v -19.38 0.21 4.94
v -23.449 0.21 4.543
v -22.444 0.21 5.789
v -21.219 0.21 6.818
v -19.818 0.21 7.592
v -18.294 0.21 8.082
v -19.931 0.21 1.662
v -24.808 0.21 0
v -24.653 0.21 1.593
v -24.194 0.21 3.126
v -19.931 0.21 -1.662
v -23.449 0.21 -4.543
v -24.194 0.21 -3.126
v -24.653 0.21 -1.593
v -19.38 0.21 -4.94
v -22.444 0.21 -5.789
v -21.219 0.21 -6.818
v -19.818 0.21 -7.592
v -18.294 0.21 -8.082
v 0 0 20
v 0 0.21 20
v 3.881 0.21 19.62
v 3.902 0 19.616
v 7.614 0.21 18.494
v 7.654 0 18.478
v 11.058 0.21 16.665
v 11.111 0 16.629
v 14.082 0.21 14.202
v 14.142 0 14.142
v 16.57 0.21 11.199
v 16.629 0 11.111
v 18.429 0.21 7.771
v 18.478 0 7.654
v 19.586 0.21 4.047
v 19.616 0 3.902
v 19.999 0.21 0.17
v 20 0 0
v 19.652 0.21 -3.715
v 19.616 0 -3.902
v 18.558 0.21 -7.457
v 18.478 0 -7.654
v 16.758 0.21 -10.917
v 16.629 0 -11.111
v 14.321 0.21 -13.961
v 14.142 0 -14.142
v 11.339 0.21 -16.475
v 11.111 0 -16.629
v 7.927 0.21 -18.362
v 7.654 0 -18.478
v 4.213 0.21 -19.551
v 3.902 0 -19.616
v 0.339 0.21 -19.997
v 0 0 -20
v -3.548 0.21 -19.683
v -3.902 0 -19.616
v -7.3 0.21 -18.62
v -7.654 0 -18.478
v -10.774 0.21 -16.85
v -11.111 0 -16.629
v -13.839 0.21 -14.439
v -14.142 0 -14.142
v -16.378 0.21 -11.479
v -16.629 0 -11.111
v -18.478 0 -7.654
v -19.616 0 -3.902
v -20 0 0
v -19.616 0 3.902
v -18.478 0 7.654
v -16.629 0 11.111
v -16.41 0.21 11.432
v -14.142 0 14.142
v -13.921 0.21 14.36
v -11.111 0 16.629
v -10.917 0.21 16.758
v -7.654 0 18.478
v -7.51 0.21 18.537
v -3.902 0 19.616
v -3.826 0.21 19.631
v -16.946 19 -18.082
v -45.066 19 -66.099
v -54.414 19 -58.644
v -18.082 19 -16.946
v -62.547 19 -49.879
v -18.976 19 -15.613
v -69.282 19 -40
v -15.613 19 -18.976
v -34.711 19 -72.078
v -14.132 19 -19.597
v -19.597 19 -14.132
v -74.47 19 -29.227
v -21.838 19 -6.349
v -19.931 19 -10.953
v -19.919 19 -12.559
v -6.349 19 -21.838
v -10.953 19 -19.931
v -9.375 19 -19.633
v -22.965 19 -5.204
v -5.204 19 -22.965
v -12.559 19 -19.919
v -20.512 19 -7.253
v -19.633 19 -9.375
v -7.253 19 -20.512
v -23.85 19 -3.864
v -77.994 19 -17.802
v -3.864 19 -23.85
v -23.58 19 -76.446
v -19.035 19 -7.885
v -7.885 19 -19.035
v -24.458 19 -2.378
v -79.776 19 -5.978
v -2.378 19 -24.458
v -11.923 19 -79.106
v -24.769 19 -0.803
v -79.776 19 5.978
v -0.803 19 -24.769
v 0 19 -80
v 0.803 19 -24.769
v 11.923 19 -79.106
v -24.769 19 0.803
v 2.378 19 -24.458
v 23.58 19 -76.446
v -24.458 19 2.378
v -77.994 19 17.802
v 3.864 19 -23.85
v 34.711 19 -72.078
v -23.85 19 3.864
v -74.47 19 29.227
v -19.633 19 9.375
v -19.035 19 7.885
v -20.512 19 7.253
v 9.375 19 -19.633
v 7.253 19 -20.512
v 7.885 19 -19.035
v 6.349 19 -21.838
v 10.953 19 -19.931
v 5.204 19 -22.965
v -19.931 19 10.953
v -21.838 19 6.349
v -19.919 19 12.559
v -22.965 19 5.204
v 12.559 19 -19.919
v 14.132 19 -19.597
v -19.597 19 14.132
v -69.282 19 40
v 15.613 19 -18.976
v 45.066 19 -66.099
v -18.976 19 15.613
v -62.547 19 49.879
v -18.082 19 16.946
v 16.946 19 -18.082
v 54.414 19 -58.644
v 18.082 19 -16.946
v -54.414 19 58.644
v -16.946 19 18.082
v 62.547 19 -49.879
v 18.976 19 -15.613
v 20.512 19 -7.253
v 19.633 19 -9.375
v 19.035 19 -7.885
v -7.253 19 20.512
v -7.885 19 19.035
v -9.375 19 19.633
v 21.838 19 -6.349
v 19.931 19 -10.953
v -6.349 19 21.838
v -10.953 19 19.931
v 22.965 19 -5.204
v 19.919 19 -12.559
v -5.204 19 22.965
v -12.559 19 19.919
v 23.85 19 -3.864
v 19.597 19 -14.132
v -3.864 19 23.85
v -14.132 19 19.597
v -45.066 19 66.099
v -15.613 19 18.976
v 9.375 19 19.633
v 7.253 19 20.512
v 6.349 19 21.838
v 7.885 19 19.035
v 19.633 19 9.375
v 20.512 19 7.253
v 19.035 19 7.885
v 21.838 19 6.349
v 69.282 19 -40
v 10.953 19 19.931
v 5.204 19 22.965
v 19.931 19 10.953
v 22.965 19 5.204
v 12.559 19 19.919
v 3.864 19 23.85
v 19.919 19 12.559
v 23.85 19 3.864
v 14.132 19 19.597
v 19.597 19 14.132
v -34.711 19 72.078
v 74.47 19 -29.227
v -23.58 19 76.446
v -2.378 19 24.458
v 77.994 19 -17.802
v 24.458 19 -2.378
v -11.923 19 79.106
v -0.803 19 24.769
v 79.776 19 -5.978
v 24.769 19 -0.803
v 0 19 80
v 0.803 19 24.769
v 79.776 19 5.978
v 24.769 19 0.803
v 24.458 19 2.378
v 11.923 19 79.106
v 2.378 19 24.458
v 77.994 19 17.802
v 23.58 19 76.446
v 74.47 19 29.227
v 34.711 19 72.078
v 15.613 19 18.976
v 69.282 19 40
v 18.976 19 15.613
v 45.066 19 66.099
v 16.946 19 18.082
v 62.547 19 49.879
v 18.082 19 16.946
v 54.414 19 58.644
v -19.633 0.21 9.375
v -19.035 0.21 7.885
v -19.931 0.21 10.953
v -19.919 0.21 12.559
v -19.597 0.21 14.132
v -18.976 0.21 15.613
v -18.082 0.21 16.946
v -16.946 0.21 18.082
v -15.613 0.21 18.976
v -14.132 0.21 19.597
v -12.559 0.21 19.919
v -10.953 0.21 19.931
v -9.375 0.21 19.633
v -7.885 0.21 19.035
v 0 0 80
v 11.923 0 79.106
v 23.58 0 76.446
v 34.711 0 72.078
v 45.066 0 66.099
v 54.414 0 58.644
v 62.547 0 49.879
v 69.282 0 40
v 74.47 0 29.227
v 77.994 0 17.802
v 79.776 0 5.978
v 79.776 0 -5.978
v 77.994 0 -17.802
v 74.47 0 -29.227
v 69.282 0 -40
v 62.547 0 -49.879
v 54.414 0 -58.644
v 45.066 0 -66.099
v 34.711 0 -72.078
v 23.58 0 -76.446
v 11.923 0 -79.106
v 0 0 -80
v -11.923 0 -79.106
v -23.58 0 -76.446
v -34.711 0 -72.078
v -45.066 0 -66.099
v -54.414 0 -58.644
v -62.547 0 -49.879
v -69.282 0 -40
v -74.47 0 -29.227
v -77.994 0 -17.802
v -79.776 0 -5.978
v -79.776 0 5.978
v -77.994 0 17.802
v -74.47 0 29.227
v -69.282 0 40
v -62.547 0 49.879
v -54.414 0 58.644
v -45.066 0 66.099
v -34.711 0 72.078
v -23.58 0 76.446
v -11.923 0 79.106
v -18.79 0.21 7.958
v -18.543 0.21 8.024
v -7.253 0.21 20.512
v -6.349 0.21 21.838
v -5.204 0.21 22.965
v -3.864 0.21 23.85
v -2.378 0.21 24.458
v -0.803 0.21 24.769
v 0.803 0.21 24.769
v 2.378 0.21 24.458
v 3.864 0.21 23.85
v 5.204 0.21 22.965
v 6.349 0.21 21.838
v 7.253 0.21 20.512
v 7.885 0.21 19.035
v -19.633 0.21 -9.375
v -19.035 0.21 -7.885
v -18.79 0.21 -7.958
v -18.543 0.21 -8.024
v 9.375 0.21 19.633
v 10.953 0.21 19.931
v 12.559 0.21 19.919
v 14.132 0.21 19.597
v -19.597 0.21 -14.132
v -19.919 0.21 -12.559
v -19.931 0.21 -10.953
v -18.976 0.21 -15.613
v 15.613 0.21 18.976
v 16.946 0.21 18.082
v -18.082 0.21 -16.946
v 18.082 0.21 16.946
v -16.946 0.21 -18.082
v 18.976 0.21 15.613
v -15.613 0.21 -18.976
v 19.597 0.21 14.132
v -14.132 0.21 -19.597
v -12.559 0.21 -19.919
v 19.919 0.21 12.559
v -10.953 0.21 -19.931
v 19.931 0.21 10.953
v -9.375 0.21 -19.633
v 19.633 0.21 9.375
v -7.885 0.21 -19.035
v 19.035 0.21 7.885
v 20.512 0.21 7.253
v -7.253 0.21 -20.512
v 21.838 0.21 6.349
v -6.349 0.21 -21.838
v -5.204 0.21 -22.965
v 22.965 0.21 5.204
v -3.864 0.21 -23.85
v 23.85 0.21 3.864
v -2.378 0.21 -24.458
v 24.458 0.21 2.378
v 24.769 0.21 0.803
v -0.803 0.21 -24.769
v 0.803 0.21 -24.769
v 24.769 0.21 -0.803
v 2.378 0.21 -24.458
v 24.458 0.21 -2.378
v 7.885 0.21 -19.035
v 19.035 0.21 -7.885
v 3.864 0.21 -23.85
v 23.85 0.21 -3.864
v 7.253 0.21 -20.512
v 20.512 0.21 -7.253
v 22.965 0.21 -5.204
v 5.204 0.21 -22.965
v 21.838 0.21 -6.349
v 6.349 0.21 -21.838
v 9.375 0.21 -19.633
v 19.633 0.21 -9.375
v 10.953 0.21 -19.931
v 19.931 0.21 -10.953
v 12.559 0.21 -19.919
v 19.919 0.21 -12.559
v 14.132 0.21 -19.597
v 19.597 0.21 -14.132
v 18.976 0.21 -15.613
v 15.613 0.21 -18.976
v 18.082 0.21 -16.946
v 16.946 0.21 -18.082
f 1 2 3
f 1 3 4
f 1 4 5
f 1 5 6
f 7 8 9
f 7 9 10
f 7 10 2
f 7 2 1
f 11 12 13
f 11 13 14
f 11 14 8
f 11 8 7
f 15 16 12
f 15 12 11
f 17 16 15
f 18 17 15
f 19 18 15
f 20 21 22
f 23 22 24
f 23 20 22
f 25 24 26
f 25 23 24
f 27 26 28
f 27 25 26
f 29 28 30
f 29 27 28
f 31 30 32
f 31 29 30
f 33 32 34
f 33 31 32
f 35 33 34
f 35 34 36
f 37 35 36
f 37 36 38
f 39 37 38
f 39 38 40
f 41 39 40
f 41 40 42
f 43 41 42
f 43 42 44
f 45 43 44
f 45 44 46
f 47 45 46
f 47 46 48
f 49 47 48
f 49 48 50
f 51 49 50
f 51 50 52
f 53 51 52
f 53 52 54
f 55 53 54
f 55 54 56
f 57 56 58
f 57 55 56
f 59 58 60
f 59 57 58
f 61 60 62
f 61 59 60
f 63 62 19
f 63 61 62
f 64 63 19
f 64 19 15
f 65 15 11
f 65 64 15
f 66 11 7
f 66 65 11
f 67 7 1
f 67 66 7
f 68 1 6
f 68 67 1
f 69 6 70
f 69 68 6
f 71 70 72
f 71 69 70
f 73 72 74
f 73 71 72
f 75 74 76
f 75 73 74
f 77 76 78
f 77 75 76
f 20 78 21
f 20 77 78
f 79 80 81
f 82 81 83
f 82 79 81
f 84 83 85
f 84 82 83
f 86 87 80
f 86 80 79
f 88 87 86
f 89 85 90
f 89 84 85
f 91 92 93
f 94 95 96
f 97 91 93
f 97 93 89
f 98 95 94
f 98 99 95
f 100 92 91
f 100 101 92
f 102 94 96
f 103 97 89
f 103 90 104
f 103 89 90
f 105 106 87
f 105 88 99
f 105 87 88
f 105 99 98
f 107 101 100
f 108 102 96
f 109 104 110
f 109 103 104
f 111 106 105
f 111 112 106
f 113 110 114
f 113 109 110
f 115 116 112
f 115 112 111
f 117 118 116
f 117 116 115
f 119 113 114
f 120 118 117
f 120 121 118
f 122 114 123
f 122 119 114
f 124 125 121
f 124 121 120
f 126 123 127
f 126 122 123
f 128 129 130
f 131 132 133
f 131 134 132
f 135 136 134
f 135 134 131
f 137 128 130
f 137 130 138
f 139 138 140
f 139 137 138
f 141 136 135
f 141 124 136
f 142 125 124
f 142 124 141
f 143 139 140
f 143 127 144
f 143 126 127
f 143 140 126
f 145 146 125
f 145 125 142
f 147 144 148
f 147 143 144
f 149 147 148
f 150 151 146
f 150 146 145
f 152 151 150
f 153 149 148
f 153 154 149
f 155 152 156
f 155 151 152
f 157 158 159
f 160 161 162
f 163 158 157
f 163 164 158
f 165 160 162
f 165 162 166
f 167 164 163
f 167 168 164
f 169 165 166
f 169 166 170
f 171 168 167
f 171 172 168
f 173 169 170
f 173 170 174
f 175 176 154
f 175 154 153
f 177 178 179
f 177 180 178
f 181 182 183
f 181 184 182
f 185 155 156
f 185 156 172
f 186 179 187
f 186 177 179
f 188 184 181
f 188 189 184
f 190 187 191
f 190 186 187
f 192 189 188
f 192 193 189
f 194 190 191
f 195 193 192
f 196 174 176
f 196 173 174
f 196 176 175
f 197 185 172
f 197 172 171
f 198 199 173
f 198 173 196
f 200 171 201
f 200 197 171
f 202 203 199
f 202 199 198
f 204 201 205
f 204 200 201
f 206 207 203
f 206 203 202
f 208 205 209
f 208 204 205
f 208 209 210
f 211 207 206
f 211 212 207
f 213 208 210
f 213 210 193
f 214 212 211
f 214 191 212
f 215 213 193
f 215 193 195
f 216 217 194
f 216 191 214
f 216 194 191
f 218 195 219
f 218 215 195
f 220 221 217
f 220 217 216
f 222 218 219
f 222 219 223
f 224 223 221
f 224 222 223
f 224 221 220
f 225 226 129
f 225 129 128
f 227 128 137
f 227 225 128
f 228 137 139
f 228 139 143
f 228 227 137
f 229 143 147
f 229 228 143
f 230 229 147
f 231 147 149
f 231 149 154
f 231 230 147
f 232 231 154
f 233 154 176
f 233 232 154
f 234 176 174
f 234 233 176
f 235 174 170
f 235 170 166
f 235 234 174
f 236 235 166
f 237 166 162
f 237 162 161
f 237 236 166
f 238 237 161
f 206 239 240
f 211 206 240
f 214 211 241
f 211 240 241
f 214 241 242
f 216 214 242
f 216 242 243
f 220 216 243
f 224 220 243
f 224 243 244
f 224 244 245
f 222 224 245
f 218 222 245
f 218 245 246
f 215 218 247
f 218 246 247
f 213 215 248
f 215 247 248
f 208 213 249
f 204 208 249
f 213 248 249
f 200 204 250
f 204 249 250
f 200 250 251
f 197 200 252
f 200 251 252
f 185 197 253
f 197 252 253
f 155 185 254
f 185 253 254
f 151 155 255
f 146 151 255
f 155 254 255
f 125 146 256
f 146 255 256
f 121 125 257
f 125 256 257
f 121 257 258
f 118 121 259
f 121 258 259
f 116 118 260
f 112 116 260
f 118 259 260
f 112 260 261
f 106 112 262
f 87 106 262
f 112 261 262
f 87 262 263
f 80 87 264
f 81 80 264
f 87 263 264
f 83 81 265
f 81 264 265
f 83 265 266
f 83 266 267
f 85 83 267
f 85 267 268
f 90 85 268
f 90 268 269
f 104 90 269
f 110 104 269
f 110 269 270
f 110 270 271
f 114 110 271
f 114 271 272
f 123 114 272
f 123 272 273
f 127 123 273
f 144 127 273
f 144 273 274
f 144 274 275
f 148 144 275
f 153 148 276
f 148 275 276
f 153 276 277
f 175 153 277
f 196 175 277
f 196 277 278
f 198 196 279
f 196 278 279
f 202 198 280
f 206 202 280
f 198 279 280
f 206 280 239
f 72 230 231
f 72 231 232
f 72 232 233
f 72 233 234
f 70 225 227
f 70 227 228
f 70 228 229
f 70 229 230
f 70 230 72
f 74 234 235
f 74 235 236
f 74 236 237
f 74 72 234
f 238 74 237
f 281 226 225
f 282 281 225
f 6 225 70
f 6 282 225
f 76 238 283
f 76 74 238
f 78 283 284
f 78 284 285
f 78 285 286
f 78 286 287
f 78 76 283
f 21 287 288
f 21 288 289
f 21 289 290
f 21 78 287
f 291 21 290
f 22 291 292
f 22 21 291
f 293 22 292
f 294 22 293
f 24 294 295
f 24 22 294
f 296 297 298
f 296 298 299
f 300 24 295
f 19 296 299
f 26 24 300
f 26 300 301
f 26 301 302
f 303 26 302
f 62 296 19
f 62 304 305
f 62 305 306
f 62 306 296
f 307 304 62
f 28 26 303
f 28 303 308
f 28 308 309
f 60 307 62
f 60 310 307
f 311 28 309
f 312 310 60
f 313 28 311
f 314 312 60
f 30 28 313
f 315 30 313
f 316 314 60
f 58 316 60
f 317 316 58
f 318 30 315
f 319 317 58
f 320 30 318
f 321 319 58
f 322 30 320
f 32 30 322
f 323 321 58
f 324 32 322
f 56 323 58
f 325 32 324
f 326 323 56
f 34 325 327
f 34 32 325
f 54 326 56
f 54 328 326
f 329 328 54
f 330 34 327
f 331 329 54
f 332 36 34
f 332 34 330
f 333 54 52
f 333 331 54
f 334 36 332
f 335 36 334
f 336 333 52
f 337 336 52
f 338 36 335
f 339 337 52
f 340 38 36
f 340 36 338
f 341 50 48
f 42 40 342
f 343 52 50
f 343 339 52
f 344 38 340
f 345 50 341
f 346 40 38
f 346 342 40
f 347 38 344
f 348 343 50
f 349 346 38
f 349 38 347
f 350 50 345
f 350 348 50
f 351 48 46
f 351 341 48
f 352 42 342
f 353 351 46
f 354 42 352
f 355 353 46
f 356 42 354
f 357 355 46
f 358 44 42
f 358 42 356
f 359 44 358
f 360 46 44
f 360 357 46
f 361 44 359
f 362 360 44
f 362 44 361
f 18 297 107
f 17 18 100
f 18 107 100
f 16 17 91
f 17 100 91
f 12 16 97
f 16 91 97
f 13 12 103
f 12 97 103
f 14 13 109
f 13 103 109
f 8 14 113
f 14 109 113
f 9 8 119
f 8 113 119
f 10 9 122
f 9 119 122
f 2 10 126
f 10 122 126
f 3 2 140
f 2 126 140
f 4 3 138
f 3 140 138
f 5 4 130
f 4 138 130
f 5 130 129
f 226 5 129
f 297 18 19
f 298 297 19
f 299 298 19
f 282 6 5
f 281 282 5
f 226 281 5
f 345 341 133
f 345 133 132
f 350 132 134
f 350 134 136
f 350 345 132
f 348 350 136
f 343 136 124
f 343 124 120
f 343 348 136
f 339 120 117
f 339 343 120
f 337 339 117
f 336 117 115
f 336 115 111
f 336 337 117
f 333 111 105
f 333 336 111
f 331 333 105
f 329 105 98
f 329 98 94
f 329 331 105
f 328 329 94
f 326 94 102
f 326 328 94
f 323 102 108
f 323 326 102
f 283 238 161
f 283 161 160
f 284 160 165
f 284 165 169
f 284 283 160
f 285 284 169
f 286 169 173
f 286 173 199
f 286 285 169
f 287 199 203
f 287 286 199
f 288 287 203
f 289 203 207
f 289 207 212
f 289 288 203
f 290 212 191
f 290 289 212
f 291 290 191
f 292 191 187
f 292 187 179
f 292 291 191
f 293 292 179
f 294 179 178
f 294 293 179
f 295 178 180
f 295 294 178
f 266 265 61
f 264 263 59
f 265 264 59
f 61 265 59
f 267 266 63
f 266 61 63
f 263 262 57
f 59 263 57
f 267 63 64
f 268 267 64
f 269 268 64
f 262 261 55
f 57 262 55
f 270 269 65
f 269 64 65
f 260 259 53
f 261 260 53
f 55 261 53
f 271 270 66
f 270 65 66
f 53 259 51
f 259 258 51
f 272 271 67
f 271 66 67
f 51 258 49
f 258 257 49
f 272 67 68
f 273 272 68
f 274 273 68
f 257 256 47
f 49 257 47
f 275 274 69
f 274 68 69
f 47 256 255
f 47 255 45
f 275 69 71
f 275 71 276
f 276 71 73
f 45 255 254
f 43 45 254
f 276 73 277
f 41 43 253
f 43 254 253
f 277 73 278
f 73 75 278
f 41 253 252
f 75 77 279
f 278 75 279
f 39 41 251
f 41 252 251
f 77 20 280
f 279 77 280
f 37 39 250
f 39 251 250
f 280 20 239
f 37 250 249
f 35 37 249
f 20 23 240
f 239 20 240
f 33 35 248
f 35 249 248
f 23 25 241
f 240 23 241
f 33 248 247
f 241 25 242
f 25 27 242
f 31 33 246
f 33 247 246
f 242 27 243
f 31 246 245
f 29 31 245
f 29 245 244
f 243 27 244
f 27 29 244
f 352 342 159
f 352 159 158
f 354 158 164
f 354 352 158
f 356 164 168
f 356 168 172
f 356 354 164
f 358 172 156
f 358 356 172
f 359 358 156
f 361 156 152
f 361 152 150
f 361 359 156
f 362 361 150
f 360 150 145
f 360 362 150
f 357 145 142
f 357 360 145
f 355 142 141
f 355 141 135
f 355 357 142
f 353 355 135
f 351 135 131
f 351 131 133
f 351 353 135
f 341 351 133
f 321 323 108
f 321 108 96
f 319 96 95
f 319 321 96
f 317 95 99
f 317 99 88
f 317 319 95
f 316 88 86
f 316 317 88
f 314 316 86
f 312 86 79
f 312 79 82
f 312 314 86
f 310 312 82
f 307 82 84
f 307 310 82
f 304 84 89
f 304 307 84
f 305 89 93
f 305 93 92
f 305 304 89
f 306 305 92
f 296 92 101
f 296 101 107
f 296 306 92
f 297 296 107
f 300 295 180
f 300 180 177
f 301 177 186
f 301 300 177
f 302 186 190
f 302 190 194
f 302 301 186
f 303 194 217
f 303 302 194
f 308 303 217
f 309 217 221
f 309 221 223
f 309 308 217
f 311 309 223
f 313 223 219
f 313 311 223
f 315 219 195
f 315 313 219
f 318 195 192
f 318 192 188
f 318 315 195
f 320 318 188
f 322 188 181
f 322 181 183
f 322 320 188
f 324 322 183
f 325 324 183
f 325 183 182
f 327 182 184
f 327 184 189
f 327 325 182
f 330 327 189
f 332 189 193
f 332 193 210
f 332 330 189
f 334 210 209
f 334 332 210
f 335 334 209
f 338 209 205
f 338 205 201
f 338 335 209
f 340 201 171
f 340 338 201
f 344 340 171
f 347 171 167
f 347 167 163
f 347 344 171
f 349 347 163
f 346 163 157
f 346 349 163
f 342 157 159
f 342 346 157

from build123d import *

# Parameters (mm, degrees)
SKETCH1_R           = 80
BOSS_EXTRUDE1_DEPTH = 19
SKETCH2_R           = 20
CUT_EXTRUDE1_DEPTH  = 115.721401665
SKETCH3_R           = 8.271230521
CUT_EXTRUDE2_DEPTH  = 18.790390573
CIRPATTERN1_COUNT   = 8


with BuildPart() as part:
    # Sketch1 → Boss-Extrude1 (new body)
    with BuildSketch(Plane(origin=(0, 0, 0), x_dir=(1, 0, 0), z_dir=(0, 1, 0))):
        Circle(SKETCH1_R)
    extrude(amount=BOSS_EXTRUDE1_DEPTH)

    # Sketch2 → Cut-Extrude1 (cut, through all)
    with BuildSketch(Plane(origin=(0, 0, 0), x_dir=(1, 0, 0), z_dir=(0, 1, 0))):
        Circle(SKETCH2_R)
    extrude(amount=CUT_EXTRUDE1_DEPTH, mode=Mode.SUBTRACT)

    # Sketch3 → Cut-Extrude2 (cut)
    with BuildSketch(Plane(origin=(0, 19, 0), x_dir=(1, 0, 0), z_dir=(0, 1, 0))):
        with Locations((-16.536495709, 0)):
            Circle(SKETCH3_R)
    cut_extrude2 = extrude(amount=-CUT_EXTRUDE2_DEPTH, mode=Mode.SUBTRACT)

    # CirPattern1: Cut-Extrude2 ×8 about axis
    cirpattern1_axis = Axis((0, 0, 0), (0, 1, 0))
    for i in range(1, CIRPATTERN1_COUNT):
        add(cut_extrude2.rotate(cirpattern1_axis, i * 360 / CIRPATTERN1_COUNT), mode=Mode.SUBTRACT)


solid = part.part
